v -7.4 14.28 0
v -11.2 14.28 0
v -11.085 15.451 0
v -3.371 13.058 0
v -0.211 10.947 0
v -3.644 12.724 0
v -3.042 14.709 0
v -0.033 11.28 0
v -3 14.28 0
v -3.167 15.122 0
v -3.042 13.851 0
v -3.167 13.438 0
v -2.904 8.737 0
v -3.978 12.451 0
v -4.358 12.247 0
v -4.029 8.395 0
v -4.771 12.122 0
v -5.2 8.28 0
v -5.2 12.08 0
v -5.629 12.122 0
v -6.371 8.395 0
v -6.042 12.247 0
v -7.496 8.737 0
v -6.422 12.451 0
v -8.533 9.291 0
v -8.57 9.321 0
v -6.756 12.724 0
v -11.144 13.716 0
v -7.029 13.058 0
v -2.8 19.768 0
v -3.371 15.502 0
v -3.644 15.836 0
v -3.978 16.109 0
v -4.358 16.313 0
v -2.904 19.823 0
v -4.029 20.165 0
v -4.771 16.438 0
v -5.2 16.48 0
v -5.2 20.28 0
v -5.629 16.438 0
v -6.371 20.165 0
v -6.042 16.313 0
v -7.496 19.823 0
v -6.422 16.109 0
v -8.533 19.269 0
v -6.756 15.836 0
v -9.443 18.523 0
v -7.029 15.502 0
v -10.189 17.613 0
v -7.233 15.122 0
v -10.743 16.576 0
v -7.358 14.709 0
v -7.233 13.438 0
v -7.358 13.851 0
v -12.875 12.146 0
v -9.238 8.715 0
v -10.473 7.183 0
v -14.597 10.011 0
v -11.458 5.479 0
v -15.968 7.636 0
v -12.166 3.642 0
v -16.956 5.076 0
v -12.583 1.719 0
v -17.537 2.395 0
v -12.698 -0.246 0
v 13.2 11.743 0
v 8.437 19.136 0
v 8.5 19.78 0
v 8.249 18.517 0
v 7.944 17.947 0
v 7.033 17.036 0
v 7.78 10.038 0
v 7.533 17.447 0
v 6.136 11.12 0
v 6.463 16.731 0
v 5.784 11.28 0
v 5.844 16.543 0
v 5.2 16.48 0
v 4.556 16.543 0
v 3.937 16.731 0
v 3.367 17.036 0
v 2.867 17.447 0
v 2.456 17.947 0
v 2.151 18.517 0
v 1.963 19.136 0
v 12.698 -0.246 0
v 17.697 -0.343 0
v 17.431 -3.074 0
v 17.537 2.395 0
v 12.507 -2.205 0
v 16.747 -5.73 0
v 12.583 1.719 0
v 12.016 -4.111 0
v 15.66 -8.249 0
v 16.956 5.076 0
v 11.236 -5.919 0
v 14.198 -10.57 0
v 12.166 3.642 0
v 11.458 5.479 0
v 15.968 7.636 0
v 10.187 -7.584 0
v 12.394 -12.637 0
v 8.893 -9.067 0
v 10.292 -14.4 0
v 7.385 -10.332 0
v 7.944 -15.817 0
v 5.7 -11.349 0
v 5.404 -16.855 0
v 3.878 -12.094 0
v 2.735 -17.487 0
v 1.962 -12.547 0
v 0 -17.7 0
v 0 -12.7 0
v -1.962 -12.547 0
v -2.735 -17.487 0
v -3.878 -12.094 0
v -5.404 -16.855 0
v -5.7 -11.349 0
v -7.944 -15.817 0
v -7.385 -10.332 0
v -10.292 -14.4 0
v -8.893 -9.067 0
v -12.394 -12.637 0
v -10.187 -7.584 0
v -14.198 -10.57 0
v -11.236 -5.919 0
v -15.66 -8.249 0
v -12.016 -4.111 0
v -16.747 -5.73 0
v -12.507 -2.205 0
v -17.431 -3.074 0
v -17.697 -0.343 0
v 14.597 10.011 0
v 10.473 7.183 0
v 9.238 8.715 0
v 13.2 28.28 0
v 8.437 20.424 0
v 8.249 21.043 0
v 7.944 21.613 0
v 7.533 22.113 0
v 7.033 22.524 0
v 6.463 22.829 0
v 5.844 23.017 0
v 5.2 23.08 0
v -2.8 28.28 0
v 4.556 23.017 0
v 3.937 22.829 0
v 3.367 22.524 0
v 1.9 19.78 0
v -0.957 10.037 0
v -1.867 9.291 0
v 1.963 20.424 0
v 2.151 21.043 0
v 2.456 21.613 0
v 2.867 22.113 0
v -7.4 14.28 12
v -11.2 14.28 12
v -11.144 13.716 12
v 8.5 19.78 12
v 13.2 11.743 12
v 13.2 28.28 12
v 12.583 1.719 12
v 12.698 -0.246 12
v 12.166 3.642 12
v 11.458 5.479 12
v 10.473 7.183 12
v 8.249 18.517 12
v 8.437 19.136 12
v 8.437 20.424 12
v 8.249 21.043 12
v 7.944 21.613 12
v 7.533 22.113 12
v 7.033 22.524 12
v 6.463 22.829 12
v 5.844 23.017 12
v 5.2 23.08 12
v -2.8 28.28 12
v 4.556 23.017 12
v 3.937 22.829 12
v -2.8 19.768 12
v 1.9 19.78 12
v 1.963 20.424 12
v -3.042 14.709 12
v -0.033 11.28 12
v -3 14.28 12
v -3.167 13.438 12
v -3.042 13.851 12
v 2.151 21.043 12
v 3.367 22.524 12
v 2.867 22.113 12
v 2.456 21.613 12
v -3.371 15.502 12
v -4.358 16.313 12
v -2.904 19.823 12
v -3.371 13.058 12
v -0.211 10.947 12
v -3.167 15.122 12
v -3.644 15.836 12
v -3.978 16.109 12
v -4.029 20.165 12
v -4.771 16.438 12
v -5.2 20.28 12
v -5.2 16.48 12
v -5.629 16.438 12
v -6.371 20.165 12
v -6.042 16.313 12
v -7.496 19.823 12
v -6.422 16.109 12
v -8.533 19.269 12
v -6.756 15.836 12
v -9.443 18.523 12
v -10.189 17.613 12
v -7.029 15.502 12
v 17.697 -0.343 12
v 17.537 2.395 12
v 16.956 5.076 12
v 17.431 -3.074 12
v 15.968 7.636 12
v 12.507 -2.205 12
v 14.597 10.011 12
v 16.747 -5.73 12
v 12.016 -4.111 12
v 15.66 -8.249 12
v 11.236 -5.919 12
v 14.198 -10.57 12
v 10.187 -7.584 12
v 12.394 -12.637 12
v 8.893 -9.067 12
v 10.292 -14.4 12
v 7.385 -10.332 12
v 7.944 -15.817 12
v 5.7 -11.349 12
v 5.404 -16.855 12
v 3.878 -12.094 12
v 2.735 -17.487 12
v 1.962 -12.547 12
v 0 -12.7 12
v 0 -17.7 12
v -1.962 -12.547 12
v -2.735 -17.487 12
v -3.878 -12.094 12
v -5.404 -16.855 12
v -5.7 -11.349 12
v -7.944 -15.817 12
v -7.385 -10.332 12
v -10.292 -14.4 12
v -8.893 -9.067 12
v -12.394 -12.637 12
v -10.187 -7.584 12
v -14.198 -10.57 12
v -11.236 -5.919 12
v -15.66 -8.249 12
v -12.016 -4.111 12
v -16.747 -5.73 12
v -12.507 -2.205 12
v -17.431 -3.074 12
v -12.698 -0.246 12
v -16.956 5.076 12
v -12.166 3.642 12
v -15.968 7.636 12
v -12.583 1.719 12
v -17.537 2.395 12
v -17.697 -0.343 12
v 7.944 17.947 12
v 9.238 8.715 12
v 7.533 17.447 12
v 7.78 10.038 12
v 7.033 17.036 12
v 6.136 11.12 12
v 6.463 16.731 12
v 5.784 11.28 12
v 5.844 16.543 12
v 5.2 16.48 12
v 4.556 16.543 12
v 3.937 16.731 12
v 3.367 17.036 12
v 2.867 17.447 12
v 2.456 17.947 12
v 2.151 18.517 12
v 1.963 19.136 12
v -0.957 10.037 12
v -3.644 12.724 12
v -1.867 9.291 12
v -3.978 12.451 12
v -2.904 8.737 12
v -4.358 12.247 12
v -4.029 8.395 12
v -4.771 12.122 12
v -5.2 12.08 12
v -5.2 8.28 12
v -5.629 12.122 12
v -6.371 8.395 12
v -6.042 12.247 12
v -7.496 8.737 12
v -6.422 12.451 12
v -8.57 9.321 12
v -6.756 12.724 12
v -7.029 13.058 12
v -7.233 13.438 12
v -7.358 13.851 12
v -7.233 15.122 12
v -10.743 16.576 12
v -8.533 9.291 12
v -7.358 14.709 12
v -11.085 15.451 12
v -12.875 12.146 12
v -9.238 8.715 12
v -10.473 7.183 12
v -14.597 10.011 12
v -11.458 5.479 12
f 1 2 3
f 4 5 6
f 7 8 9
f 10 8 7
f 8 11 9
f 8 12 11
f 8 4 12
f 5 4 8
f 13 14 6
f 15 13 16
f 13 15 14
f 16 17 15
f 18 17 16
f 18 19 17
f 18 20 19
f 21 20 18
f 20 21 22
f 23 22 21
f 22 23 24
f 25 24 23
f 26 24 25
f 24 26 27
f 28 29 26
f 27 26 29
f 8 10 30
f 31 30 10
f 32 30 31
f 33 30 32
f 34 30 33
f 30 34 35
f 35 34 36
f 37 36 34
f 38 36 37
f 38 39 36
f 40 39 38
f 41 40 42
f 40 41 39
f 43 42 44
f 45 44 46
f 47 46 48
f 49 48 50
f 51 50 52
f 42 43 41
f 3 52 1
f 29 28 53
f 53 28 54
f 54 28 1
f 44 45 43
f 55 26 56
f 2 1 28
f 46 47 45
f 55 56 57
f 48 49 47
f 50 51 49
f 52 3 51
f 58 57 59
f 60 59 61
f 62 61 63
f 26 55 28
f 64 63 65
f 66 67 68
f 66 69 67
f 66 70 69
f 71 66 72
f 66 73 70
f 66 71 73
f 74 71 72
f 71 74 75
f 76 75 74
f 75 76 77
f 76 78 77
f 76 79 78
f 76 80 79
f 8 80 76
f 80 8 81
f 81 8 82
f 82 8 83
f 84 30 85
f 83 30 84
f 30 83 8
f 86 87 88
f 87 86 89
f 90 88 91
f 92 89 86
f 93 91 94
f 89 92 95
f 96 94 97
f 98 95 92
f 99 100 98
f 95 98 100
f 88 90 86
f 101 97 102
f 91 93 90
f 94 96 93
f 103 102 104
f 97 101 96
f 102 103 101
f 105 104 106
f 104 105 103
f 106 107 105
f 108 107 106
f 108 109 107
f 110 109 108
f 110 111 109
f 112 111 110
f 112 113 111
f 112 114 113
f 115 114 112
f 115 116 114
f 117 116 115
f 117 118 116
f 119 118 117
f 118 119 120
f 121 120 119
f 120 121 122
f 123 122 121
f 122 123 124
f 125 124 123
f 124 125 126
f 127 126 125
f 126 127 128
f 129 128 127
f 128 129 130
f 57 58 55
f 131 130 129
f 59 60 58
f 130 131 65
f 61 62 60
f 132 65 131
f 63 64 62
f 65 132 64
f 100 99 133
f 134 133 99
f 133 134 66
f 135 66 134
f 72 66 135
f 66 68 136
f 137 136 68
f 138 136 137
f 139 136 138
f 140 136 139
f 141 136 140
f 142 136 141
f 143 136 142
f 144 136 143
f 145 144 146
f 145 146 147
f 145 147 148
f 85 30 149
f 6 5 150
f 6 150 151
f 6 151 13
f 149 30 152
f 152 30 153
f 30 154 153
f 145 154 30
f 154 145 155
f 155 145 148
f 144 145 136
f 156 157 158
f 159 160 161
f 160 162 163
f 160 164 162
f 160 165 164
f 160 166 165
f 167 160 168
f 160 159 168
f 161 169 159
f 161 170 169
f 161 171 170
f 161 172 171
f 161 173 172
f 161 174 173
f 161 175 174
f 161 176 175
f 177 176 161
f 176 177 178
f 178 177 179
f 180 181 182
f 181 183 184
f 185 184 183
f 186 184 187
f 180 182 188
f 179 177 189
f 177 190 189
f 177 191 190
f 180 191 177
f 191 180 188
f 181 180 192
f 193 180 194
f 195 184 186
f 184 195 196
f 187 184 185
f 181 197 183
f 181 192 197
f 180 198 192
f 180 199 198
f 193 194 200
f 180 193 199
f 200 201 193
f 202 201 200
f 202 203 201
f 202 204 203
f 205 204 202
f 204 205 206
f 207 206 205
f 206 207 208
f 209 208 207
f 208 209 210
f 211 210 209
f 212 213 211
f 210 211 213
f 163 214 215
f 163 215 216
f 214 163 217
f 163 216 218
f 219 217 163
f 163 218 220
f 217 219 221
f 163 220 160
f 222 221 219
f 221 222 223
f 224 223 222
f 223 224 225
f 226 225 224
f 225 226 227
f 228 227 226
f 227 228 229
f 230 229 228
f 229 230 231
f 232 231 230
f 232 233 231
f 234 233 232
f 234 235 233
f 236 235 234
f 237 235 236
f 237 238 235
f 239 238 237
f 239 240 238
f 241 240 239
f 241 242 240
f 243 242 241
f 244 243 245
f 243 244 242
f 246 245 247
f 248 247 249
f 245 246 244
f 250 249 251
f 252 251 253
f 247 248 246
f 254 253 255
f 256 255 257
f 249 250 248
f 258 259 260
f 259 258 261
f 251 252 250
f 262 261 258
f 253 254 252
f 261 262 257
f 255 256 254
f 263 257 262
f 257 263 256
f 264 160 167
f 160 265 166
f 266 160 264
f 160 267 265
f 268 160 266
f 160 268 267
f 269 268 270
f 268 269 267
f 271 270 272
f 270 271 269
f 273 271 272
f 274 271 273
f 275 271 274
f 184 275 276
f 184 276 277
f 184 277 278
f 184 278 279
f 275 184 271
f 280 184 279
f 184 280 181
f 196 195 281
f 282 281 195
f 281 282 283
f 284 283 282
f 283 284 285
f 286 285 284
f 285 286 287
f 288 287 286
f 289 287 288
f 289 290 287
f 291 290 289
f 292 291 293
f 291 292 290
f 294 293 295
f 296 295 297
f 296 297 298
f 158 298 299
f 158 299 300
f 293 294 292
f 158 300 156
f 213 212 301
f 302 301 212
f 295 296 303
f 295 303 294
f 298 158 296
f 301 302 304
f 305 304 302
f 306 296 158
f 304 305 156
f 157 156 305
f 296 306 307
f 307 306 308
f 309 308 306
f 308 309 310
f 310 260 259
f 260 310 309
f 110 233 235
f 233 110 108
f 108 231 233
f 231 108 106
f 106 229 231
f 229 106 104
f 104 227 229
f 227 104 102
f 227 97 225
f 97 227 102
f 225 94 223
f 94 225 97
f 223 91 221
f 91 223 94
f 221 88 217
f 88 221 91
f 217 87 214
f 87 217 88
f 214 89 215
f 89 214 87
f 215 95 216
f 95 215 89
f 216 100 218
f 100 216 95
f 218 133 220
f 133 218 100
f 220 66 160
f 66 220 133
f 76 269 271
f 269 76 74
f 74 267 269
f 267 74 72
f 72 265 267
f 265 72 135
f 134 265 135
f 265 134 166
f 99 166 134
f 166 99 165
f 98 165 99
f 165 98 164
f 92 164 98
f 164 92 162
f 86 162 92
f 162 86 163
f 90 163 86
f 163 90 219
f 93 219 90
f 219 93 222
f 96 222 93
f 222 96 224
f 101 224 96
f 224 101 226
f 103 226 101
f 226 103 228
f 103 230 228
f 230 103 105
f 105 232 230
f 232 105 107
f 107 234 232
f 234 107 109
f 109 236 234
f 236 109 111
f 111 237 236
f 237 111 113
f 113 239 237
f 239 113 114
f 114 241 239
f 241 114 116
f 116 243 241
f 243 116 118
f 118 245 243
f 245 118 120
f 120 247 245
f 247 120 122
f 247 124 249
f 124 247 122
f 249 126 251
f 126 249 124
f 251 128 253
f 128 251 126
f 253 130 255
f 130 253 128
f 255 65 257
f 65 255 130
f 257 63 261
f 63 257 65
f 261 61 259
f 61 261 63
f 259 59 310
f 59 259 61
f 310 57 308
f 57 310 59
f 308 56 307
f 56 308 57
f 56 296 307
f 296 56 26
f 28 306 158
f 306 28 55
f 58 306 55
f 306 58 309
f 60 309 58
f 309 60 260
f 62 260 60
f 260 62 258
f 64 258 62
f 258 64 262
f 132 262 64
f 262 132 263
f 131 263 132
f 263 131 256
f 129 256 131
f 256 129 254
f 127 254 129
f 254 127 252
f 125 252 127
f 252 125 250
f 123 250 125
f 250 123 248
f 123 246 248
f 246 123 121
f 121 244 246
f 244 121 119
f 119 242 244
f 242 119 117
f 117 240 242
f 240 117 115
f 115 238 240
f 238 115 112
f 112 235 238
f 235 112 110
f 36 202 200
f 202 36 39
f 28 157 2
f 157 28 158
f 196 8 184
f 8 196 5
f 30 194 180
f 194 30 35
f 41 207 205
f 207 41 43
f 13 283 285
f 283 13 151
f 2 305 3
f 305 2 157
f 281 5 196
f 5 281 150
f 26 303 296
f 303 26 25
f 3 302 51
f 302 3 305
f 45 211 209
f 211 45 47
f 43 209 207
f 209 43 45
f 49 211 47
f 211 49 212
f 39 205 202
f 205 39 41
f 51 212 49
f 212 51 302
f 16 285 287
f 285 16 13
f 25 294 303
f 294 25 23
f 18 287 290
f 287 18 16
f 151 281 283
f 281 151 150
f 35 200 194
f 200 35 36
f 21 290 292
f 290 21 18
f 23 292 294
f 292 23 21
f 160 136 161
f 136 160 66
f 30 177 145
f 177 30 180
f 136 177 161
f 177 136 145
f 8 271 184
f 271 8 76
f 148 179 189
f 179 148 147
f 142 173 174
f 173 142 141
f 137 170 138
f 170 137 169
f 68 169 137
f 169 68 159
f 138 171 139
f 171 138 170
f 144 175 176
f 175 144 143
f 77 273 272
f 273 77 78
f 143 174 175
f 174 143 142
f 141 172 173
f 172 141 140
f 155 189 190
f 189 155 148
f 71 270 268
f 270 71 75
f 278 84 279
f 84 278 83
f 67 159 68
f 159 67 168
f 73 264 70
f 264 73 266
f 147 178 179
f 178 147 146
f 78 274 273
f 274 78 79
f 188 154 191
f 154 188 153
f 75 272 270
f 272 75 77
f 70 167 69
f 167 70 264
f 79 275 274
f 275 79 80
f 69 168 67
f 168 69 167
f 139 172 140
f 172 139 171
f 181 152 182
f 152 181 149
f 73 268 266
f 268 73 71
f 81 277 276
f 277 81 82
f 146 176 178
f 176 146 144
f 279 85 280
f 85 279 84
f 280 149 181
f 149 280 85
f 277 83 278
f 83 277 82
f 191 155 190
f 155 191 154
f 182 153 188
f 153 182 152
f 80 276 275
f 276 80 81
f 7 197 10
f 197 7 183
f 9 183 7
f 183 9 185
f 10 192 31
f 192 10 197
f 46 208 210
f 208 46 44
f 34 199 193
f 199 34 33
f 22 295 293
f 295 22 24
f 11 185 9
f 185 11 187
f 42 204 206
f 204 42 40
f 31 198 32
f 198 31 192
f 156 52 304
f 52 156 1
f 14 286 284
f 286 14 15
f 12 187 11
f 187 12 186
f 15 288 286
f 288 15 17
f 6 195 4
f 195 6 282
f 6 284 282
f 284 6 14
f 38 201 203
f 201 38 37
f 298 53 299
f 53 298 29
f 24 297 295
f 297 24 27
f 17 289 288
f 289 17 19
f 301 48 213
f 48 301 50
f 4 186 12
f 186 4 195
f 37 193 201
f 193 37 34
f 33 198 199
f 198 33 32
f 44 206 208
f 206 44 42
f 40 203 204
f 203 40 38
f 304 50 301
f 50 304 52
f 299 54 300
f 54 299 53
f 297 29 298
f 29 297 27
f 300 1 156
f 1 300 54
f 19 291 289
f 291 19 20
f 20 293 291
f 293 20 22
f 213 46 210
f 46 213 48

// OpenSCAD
$fn = 32;

// ----------------------------------------------------------------------
// Pipe clamp: 35.4 mm ring, 5 mm wall, 12 mm wide
// ----------------------------------------------------------------------

// --- parameters (mm) ---
outer_r = 17.7;           // clamp outside radius
inner_r = 12.7;           // pipe bore radius
band = 5;                 // band thickness
clamp_w = 12;             // clamp width
opening = 40;             // opening angle between the ends
lug_w = 16;               // lug width
lug_len = 17;             // lug length
bolt_d = 6.6;             // bolt hole
knuckle_d = 12;           // hinge knuckle diameter
pin_d = 4.4;              // hinge pin hole

clamp_profile = [[-6.054, 16.633], [-8.551, 15.497], [-10.843, 13.99], [-12.875, 12.146], [-14.597, 10.011], [-15.968, 7.636], [-16.956, 5.076], [-17.537, 2.395], [-17.697, -0.343], [-17.431, -3.074], [-16.747, -5.73], [-15.66, -8.249], [-14.198, -10.57], [-12.394, -12.637], [-10.292, -14.4], [-7.944, -15.817], [-5.404, -16.855], [-2.735, -17.487], [0, -17.7], [2.735, -17.487], [5.404, -16.855], [7.944, -15.817], [10.292, -14.4], [12.394, -12.637], [14.198, -10.57], [15.66, -8.249], [16.747, -5.73], [17.431, -3.074], [17.697, -0.343], [17.537, 2.395], [16.956, 5.076], [15.968, 7.636], [14.597, 10.011], [12.875, 12.146], [10.843, 13.99], [8.551, 15.497], [6.054, 16.633], [4.344, 11.934], [6.136, 11.12], [7.78, 10.038], [9.238, 8.715], [10.473, 7.183], [11.458, 5.479], [12.166, 3.642], [12.583, 1.719], [12.698, -0.246], [12.507, -2.205], [12.016, -4.111], [11.236, -5.919], [10.187, -7.584], [8.893, -9.067], [7.385, -10.332], [5.7, -11.349], [3.878, -12.094], [1.962, -12.547], [0, -12.7], [-1.962, -12.547], [-3.878, -12.094], [-5.7, -11.349], [-7.385, -10.332], [-8.893, -9.067], [-10.187, -7.584], [-11.236, -5.919], [-12.016, -4.111], [-12.507, -2.205], [-12.698, -0.246], [-12.583, 1.719], [-12.166, 3.642], [-11.458, 5.479], [-10.473, 7.183], [-9.238, 8.715], [-7.78, 10.038], [-6.136, 11.12], [-4.344, 11.934]];

difference() {
  union() {
    linear_extrude(height = clamp_w) polygon(clamp_profile);
    /* hinge knuckle, sunk 2 mm into the band end */
    translate([-5.2, 14.28, 0]) cylinder(h = clamp_w, d = knuckle_d);
    /* bolt lug on the other end */
    translate([-2.8, 11.28, 0]) cube([lug_w, 17, clamp_w]);
  }
  translate([5.2, 19.78, -2.5]) cylinder(h = clamp_w + 5, d = bolt_d);
  translate([-5.2, 14.28, -2.5]) cylinder(h = clamp_w + 5, d = pin_d);
}
